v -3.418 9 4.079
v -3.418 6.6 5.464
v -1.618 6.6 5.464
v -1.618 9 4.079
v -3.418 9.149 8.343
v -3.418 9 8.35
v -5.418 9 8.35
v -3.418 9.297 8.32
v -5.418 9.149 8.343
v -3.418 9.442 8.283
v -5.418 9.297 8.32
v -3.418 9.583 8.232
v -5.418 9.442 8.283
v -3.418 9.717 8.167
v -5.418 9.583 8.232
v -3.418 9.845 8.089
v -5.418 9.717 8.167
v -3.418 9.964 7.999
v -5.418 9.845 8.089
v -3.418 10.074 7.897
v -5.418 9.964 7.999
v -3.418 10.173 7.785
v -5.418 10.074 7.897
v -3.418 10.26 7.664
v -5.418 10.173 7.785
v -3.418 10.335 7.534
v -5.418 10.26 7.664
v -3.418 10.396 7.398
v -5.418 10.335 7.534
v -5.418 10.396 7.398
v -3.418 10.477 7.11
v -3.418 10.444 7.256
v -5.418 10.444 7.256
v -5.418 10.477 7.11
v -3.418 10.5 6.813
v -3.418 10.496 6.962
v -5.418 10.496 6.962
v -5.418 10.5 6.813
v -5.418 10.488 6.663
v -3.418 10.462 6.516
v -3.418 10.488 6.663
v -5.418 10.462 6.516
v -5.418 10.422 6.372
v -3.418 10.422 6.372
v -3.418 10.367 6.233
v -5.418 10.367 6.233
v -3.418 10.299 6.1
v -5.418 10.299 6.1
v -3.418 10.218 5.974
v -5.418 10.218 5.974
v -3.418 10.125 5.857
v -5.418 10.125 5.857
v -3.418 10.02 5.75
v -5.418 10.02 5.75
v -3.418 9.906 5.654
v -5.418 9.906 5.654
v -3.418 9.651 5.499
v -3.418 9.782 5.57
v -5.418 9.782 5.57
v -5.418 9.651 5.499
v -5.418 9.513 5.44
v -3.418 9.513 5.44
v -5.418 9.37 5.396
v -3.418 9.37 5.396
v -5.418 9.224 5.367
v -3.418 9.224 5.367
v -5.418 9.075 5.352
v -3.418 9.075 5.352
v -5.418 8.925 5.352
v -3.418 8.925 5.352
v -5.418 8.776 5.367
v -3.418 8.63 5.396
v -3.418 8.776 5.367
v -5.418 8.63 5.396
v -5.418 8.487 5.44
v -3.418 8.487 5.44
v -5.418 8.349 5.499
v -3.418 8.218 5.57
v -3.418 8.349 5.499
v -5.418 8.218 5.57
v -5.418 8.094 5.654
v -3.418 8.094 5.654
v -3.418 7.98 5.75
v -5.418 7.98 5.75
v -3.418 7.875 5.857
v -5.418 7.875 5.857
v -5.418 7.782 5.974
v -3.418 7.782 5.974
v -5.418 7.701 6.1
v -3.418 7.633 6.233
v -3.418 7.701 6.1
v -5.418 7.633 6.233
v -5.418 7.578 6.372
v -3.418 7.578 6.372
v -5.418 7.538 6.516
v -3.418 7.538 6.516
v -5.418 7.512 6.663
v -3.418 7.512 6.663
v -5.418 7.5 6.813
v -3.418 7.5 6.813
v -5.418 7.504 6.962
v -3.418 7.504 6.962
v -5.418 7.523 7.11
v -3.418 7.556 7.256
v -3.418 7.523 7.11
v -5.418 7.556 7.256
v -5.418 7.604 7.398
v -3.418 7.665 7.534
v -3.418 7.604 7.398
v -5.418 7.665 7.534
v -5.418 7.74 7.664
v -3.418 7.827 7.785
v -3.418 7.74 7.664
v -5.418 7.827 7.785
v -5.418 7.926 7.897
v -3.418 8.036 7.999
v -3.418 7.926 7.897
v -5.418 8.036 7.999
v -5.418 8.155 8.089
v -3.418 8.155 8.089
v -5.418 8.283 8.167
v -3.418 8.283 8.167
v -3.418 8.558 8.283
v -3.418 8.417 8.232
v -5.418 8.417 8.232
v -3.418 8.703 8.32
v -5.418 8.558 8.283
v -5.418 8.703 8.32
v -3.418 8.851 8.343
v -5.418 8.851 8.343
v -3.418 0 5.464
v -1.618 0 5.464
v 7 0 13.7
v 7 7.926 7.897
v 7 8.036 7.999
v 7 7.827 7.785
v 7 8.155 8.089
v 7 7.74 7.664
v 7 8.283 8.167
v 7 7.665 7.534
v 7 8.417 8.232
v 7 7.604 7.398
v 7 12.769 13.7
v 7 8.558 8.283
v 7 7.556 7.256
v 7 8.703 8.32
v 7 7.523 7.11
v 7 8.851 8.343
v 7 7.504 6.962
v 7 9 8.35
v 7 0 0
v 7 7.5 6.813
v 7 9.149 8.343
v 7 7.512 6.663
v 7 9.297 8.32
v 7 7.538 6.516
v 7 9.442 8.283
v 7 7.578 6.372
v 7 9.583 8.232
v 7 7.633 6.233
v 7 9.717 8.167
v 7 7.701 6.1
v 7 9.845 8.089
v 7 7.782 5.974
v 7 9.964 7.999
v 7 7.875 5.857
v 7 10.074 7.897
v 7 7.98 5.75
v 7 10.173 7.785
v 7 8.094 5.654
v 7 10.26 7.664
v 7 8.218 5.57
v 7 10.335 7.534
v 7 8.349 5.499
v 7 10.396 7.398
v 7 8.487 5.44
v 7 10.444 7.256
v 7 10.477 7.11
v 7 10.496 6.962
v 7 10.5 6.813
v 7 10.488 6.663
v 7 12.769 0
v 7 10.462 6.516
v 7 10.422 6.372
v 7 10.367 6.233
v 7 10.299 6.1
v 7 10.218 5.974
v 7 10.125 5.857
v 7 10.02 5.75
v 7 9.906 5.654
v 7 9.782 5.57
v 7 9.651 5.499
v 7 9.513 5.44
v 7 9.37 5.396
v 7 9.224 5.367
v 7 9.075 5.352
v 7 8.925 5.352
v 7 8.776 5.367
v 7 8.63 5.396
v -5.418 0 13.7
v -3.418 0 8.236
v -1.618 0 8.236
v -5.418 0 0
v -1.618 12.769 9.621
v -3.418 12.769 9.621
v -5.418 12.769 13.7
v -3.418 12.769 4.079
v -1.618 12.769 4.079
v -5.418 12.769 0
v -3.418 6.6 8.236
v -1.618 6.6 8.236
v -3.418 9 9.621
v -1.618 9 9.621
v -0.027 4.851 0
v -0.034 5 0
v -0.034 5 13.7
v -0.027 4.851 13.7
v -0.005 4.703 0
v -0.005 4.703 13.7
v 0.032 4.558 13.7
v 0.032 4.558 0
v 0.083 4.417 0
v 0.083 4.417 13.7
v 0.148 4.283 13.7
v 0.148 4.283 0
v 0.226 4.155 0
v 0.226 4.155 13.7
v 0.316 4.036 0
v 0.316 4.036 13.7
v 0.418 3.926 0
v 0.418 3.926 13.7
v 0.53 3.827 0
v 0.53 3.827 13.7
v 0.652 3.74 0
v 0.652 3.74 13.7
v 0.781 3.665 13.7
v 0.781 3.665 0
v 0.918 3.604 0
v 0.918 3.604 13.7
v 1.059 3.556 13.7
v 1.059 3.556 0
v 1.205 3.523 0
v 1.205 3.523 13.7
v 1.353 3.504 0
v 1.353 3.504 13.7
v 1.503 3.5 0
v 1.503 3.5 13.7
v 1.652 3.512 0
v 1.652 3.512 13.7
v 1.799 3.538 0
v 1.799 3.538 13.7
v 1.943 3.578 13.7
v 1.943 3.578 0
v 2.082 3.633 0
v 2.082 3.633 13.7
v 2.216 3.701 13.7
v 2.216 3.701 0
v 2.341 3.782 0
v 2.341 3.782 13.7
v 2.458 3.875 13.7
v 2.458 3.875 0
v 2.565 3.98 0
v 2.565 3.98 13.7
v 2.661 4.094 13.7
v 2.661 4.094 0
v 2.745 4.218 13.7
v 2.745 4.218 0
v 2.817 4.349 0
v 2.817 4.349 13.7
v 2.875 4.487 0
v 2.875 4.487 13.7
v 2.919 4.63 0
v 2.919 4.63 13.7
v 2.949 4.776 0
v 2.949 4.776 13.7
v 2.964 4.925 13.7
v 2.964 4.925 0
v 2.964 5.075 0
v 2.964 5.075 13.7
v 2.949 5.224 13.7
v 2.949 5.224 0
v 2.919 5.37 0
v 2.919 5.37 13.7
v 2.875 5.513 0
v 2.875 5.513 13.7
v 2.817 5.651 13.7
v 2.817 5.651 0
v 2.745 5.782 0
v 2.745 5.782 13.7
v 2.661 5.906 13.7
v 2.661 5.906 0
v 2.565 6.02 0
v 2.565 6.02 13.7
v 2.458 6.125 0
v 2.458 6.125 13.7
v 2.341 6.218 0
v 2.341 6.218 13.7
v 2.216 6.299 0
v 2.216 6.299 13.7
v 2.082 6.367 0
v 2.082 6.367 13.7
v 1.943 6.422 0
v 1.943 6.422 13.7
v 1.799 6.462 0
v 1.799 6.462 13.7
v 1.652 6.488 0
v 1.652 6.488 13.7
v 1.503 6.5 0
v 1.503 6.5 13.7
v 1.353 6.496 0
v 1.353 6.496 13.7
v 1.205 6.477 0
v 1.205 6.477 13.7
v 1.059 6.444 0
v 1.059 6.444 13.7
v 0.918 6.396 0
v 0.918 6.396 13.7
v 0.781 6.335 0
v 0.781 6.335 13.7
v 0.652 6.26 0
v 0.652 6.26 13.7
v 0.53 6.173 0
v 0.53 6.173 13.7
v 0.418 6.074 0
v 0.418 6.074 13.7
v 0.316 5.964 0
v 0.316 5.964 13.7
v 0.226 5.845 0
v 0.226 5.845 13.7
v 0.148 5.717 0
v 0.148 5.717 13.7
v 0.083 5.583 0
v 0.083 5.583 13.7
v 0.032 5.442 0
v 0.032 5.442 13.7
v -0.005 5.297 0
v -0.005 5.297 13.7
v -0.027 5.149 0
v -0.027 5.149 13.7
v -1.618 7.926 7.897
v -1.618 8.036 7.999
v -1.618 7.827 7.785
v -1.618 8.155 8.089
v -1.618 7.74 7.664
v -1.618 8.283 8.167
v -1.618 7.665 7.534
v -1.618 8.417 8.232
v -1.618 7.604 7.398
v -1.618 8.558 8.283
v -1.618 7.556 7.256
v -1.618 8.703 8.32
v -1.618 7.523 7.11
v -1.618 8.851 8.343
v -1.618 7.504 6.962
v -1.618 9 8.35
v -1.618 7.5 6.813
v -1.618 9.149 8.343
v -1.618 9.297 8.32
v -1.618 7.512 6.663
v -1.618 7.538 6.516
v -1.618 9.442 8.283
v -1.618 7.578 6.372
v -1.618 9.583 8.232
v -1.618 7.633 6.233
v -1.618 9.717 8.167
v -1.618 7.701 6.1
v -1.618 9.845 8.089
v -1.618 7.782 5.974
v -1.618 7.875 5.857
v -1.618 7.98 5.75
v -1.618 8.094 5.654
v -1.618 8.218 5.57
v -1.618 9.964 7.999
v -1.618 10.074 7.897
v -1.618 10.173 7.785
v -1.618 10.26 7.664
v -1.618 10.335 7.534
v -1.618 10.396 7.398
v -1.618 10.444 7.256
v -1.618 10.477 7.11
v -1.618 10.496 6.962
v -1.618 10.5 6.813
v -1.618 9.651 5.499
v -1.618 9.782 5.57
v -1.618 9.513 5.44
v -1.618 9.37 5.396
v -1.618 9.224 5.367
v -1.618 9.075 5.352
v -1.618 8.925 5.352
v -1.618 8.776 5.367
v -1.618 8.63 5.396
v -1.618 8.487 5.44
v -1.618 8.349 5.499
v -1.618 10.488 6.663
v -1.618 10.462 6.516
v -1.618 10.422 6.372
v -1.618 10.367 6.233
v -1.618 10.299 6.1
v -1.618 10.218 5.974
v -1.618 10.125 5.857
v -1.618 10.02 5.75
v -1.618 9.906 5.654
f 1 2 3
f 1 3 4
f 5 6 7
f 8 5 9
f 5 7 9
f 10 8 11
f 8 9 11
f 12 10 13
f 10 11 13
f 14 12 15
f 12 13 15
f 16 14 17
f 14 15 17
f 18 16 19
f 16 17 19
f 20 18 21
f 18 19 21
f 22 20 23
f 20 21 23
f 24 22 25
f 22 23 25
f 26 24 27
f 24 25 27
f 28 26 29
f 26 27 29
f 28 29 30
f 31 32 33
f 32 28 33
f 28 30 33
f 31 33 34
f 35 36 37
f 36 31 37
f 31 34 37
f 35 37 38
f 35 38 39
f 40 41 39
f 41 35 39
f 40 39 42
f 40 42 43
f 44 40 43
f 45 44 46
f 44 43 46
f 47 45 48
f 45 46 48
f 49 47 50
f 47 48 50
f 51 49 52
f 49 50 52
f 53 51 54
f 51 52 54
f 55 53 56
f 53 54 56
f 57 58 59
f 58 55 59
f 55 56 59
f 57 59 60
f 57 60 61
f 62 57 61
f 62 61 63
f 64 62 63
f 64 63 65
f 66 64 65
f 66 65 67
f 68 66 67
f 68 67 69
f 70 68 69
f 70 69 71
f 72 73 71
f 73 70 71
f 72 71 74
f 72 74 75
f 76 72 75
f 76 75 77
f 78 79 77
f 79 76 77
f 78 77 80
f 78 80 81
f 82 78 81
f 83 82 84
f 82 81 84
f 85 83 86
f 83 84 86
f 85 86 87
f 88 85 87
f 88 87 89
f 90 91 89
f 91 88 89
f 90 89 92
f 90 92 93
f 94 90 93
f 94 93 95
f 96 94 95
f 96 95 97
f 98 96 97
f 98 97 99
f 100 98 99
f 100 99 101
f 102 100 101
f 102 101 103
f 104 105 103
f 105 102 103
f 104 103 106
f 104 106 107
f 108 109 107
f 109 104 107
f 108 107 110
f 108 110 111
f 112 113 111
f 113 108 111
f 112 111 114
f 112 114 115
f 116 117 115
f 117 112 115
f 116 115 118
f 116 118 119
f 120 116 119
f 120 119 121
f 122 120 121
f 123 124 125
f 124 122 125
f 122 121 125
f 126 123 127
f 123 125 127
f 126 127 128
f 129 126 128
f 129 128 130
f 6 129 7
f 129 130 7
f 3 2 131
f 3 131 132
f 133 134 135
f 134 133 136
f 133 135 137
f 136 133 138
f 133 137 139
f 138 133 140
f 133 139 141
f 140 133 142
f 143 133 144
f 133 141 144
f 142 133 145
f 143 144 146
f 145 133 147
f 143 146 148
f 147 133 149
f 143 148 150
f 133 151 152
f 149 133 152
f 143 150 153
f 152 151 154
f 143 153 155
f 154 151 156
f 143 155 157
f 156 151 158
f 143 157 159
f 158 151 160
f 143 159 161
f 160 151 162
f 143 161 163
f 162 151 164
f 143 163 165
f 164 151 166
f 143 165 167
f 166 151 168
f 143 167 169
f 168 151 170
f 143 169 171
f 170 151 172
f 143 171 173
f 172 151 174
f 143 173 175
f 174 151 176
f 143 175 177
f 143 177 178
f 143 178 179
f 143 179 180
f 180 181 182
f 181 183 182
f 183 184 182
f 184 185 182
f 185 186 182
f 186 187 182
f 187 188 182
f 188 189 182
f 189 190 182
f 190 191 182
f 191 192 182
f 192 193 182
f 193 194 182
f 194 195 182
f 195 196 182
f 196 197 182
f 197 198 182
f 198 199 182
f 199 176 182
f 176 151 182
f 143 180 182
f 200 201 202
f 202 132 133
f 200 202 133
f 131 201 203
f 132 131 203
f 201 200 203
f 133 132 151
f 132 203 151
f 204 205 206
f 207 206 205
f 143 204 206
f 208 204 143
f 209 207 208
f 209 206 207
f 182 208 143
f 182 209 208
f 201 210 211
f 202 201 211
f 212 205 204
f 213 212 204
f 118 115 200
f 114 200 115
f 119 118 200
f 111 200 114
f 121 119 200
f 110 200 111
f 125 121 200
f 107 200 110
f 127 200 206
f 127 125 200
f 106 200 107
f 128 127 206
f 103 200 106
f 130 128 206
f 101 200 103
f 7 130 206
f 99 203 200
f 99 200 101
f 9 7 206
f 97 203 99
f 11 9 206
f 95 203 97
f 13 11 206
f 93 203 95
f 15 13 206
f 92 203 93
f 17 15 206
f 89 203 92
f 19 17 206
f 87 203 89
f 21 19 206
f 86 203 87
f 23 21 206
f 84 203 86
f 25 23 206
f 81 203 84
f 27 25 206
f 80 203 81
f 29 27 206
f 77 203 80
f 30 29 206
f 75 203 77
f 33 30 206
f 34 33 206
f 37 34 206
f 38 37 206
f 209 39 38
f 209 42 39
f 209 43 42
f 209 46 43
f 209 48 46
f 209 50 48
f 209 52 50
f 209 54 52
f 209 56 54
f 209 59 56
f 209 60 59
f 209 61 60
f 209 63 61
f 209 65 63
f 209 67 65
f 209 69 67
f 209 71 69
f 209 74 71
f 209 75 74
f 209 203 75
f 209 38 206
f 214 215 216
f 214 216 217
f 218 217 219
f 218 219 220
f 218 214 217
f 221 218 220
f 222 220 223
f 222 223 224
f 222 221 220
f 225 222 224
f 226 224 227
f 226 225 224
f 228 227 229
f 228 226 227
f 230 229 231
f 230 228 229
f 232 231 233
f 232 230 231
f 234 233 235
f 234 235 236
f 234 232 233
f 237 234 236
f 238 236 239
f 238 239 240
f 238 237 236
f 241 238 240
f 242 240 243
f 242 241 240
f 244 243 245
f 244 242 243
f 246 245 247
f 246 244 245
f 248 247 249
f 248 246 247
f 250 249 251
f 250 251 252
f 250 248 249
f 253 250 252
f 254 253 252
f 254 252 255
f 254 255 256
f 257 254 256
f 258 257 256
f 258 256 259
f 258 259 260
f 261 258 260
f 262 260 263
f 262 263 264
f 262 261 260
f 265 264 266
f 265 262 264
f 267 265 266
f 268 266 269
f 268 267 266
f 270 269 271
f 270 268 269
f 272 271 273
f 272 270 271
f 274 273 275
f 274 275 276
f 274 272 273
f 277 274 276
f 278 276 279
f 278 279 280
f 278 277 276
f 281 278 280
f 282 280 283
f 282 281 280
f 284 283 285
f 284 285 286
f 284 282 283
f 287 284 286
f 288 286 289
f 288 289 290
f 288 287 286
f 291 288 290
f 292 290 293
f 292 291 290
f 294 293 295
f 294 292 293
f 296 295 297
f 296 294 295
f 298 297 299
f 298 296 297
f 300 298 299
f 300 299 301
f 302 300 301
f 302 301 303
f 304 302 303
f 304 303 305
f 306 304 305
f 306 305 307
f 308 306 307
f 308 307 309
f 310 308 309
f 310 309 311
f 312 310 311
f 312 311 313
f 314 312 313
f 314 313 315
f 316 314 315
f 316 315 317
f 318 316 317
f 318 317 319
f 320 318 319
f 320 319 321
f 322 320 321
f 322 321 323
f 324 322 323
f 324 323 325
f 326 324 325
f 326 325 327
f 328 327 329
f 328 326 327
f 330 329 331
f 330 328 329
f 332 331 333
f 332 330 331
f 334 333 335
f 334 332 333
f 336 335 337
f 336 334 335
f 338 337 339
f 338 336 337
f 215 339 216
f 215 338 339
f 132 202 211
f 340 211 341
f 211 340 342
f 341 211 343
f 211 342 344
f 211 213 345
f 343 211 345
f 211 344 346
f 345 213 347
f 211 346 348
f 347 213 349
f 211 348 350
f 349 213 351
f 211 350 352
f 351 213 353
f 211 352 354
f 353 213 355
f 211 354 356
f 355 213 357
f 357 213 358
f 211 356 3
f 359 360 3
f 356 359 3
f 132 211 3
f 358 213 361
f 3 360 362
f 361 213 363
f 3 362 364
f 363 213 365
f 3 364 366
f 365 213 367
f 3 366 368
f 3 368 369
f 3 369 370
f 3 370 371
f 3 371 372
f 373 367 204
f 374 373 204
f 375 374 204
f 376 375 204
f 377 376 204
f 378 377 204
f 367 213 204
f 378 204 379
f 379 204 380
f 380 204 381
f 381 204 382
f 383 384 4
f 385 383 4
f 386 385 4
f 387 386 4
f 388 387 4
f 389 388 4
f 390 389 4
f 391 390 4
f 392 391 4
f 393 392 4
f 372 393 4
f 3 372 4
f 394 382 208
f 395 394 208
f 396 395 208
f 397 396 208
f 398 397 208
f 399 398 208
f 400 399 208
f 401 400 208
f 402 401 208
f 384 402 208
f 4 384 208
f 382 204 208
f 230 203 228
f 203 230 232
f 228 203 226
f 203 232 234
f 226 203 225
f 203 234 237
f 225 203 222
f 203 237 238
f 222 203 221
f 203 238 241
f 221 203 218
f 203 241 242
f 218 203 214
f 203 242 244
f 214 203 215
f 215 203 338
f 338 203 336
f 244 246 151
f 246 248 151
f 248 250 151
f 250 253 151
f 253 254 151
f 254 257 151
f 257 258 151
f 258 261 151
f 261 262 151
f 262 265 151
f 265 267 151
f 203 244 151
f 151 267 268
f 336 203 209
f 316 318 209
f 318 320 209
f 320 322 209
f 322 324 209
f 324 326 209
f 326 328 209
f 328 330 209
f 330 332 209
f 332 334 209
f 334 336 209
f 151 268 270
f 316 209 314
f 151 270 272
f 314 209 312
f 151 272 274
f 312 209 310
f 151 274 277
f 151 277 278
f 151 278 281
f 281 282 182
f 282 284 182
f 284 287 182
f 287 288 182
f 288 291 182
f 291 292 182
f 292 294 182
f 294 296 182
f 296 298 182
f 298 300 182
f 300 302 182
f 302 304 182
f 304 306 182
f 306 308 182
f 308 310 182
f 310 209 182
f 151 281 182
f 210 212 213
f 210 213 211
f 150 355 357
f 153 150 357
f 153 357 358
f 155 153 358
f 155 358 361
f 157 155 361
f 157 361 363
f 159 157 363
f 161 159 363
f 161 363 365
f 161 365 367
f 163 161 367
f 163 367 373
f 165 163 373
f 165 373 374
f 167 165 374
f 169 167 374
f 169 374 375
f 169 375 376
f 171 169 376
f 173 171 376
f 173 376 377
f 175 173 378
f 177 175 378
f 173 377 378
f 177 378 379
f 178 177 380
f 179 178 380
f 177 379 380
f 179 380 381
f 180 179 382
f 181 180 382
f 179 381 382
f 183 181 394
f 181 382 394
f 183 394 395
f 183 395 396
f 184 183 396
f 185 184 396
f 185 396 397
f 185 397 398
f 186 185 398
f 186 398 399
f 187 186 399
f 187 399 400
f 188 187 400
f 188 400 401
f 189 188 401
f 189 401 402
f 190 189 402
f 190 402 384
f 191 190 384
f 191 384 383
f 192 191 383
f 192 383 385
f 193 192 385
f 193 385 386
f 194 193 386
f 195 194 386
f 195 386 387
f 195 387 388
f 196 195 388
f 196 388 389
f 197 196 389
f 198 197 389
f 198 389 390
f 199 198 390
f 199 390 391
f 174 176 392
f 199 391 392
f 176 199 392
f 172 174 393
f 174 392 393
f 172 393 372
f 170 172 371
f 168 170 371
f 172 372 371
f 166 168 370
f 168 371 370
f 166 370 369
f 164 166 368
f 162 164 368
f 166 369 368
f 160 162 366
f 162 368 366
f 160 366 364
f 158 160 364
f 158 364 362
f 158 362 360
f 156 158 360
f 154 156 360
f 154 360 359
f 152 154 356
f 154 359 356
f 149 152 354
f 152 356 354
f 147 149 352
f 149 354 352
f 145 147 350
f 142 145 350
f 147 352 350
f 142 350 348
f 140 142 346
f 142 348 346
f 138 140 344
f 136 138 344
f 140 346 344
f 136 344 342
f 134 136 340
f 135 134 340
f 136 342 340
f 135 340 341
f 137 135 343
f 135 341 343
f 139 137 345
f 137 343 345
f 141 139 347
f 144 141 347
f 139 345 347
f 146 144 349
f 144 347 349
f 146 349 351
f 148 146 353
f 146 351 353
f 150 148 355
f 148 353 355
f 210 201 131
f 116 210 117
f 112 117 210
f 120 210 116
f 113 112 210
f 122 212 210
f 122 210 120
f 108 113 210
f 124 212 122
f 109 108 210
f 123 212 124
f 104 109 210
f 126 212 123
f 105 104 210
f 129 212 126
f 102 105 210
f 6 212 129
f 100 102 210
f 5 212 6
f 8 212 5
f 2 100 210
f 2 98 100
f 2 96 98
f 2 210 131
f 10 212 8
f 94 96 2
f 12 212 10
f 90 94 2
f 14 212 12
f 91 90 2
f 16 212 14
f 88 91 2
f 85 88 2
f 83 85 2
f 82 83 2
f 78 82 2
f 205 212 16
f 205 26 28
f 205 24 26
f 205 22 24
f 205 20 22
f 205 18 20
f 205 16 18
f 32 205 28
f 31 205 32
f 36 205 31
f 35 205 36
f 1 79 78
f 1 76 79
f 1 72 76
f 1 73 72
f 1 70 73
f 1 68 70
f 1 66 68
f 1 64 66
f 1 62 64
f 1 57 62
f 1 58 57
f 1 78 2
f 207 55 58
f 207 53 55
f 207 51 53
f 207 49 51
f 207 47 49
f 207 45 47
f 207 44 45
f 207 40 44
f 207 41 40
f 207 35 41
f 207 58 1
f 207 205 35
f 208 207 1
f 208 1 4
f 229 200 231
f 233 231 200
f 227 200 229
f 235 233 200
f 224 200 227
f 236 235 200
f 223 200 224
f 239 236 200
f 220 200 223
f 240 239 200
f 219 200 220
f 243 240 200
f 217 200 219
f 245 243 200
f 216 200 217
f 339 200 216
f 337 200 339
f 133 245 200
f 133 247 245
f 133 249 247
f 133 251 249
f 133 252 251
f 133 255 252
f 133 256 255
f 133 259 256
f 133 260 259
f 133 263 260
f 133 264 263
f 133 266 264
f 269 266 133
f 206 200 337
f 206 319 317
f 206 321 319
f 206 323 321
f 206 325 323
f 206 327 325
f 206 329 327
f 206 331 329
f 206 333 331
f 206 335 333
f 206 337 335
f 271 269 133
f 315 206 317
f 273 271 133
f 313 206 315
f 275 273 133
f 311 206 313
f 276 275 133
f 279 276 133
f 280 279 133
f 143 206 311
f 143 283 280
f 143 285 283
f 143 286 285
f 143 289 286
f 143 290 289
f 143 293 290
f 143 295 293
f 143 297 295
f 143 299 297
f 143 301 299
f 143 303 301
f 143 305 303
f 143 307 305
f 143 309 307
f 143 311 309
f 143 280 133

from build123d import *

# Parameters (mm, degrees)
SKETCH1_W           = 12.41763252
SKETCH1_H           = 12.769068876
SKETCH1_R           = 1.5
BOSS_EXTRUDE1_DEPTH = 13.7
SKETCH2_R           = 1.5
CUT_EXTRUDE1_DEPTH  = 23.47079699
CUT_EXTRUDE2_DEPTH  = 1.8
SKETCH5_W           = 1.8
SKETCH5_H           = 5.542562584
CUT_EXTRUDE4_DEPTH  = 3.769069
SKETCH6_W           = 1.8
SKETCH6_H           = 2.771281292
CUT_EXTRUDE5_DEPTH  = 17.740669043


with BuildPart() as part:
    # Sketch1 → Boss-Extrude1 (new body)
    # profile 1 of 2: a face of its own
    with BuildSketch(Plane.XY):
        with Locations((0.79118374, 6.384534438)):
            Rectangle(SKETCH1_W, SKETCH1_H)
        with Locations(Location((1.465537563, 5, 0), (0, 0, 180))):
            Circle(SKETCH1_R, mode=Mode.SUBTRACT)
        with Locations((1.465537563, 10)):
            Circle(SKETCH1_R, mode=Mode.SUBTRACT)
    # profile 2 of 2: a face of its own
    with BuildSketch(Plane.XY):
        with Locations((1.465537563, 10)):
            Circle(SKETCH1_R)
    extrude(amount=BOSS_EXTRUDE1_DEPTH)

    # Sketch2 → Cut-Extrude1 (cut, through all)
    with BuildSketch(Plane.ZY.offset(5.41763252)):
        with Locations((6.85, 9)):
            Circle(SKETCH2_R)
    extrude(amount=-CUT_EXTRUDE1_DEPTH, mode=Mode.SUBTRACT)

    # Sketch3 → Cut-Extrude2 (cut)
    with BuildSketch(Plane(origin=(-3.41763252, 0, 0), x_dir=(0, 0, -1), z_dir=(1, 0, 0))):
        Polygon((-5.464359354, 6.6), (-4.078718708, 9), (-5.464359354, 11.4), (-8.235640646, 11.4), (-9.621281292, 9), (-8.235640646, 6.6), align=None)
    extrude(amount=CUT_EXTRUDE2_DEPTH, mode=Mode.SUBTRACT)

    # Sketch5 → Cut-Extrude4 (cut)
    with BuildSketch(Plane(origin=(0, 12.769068876, 0), x_dir=(1, 0, 0), z_dir=(0, 1, 0))):
        with Locations((-2.51763252, -6.85)):
            Rectangle(SKETCH5_W, SKETCH5_H)
    extrude(amount=-CUT_EXTRUDE4_DEPTH, mode=Mode.SUBTRACT)

    # Sketch6 → Cut-Extrude5 (cut, through all)
    with BuildSketch(Plane(origin=(0, 6.6, 0), x_dir=(1, 0, 0), z_dir=(0, 1, 0))):
        with Locations((-2.51763252, -6.85)):
            Rectangle(SKETCH6_W, SKETCH6_H)
    extrude(amount=-CUT_EXTRUDE5_DEPTH, mode=Mode.SUBTRACT)


solid = part.part
